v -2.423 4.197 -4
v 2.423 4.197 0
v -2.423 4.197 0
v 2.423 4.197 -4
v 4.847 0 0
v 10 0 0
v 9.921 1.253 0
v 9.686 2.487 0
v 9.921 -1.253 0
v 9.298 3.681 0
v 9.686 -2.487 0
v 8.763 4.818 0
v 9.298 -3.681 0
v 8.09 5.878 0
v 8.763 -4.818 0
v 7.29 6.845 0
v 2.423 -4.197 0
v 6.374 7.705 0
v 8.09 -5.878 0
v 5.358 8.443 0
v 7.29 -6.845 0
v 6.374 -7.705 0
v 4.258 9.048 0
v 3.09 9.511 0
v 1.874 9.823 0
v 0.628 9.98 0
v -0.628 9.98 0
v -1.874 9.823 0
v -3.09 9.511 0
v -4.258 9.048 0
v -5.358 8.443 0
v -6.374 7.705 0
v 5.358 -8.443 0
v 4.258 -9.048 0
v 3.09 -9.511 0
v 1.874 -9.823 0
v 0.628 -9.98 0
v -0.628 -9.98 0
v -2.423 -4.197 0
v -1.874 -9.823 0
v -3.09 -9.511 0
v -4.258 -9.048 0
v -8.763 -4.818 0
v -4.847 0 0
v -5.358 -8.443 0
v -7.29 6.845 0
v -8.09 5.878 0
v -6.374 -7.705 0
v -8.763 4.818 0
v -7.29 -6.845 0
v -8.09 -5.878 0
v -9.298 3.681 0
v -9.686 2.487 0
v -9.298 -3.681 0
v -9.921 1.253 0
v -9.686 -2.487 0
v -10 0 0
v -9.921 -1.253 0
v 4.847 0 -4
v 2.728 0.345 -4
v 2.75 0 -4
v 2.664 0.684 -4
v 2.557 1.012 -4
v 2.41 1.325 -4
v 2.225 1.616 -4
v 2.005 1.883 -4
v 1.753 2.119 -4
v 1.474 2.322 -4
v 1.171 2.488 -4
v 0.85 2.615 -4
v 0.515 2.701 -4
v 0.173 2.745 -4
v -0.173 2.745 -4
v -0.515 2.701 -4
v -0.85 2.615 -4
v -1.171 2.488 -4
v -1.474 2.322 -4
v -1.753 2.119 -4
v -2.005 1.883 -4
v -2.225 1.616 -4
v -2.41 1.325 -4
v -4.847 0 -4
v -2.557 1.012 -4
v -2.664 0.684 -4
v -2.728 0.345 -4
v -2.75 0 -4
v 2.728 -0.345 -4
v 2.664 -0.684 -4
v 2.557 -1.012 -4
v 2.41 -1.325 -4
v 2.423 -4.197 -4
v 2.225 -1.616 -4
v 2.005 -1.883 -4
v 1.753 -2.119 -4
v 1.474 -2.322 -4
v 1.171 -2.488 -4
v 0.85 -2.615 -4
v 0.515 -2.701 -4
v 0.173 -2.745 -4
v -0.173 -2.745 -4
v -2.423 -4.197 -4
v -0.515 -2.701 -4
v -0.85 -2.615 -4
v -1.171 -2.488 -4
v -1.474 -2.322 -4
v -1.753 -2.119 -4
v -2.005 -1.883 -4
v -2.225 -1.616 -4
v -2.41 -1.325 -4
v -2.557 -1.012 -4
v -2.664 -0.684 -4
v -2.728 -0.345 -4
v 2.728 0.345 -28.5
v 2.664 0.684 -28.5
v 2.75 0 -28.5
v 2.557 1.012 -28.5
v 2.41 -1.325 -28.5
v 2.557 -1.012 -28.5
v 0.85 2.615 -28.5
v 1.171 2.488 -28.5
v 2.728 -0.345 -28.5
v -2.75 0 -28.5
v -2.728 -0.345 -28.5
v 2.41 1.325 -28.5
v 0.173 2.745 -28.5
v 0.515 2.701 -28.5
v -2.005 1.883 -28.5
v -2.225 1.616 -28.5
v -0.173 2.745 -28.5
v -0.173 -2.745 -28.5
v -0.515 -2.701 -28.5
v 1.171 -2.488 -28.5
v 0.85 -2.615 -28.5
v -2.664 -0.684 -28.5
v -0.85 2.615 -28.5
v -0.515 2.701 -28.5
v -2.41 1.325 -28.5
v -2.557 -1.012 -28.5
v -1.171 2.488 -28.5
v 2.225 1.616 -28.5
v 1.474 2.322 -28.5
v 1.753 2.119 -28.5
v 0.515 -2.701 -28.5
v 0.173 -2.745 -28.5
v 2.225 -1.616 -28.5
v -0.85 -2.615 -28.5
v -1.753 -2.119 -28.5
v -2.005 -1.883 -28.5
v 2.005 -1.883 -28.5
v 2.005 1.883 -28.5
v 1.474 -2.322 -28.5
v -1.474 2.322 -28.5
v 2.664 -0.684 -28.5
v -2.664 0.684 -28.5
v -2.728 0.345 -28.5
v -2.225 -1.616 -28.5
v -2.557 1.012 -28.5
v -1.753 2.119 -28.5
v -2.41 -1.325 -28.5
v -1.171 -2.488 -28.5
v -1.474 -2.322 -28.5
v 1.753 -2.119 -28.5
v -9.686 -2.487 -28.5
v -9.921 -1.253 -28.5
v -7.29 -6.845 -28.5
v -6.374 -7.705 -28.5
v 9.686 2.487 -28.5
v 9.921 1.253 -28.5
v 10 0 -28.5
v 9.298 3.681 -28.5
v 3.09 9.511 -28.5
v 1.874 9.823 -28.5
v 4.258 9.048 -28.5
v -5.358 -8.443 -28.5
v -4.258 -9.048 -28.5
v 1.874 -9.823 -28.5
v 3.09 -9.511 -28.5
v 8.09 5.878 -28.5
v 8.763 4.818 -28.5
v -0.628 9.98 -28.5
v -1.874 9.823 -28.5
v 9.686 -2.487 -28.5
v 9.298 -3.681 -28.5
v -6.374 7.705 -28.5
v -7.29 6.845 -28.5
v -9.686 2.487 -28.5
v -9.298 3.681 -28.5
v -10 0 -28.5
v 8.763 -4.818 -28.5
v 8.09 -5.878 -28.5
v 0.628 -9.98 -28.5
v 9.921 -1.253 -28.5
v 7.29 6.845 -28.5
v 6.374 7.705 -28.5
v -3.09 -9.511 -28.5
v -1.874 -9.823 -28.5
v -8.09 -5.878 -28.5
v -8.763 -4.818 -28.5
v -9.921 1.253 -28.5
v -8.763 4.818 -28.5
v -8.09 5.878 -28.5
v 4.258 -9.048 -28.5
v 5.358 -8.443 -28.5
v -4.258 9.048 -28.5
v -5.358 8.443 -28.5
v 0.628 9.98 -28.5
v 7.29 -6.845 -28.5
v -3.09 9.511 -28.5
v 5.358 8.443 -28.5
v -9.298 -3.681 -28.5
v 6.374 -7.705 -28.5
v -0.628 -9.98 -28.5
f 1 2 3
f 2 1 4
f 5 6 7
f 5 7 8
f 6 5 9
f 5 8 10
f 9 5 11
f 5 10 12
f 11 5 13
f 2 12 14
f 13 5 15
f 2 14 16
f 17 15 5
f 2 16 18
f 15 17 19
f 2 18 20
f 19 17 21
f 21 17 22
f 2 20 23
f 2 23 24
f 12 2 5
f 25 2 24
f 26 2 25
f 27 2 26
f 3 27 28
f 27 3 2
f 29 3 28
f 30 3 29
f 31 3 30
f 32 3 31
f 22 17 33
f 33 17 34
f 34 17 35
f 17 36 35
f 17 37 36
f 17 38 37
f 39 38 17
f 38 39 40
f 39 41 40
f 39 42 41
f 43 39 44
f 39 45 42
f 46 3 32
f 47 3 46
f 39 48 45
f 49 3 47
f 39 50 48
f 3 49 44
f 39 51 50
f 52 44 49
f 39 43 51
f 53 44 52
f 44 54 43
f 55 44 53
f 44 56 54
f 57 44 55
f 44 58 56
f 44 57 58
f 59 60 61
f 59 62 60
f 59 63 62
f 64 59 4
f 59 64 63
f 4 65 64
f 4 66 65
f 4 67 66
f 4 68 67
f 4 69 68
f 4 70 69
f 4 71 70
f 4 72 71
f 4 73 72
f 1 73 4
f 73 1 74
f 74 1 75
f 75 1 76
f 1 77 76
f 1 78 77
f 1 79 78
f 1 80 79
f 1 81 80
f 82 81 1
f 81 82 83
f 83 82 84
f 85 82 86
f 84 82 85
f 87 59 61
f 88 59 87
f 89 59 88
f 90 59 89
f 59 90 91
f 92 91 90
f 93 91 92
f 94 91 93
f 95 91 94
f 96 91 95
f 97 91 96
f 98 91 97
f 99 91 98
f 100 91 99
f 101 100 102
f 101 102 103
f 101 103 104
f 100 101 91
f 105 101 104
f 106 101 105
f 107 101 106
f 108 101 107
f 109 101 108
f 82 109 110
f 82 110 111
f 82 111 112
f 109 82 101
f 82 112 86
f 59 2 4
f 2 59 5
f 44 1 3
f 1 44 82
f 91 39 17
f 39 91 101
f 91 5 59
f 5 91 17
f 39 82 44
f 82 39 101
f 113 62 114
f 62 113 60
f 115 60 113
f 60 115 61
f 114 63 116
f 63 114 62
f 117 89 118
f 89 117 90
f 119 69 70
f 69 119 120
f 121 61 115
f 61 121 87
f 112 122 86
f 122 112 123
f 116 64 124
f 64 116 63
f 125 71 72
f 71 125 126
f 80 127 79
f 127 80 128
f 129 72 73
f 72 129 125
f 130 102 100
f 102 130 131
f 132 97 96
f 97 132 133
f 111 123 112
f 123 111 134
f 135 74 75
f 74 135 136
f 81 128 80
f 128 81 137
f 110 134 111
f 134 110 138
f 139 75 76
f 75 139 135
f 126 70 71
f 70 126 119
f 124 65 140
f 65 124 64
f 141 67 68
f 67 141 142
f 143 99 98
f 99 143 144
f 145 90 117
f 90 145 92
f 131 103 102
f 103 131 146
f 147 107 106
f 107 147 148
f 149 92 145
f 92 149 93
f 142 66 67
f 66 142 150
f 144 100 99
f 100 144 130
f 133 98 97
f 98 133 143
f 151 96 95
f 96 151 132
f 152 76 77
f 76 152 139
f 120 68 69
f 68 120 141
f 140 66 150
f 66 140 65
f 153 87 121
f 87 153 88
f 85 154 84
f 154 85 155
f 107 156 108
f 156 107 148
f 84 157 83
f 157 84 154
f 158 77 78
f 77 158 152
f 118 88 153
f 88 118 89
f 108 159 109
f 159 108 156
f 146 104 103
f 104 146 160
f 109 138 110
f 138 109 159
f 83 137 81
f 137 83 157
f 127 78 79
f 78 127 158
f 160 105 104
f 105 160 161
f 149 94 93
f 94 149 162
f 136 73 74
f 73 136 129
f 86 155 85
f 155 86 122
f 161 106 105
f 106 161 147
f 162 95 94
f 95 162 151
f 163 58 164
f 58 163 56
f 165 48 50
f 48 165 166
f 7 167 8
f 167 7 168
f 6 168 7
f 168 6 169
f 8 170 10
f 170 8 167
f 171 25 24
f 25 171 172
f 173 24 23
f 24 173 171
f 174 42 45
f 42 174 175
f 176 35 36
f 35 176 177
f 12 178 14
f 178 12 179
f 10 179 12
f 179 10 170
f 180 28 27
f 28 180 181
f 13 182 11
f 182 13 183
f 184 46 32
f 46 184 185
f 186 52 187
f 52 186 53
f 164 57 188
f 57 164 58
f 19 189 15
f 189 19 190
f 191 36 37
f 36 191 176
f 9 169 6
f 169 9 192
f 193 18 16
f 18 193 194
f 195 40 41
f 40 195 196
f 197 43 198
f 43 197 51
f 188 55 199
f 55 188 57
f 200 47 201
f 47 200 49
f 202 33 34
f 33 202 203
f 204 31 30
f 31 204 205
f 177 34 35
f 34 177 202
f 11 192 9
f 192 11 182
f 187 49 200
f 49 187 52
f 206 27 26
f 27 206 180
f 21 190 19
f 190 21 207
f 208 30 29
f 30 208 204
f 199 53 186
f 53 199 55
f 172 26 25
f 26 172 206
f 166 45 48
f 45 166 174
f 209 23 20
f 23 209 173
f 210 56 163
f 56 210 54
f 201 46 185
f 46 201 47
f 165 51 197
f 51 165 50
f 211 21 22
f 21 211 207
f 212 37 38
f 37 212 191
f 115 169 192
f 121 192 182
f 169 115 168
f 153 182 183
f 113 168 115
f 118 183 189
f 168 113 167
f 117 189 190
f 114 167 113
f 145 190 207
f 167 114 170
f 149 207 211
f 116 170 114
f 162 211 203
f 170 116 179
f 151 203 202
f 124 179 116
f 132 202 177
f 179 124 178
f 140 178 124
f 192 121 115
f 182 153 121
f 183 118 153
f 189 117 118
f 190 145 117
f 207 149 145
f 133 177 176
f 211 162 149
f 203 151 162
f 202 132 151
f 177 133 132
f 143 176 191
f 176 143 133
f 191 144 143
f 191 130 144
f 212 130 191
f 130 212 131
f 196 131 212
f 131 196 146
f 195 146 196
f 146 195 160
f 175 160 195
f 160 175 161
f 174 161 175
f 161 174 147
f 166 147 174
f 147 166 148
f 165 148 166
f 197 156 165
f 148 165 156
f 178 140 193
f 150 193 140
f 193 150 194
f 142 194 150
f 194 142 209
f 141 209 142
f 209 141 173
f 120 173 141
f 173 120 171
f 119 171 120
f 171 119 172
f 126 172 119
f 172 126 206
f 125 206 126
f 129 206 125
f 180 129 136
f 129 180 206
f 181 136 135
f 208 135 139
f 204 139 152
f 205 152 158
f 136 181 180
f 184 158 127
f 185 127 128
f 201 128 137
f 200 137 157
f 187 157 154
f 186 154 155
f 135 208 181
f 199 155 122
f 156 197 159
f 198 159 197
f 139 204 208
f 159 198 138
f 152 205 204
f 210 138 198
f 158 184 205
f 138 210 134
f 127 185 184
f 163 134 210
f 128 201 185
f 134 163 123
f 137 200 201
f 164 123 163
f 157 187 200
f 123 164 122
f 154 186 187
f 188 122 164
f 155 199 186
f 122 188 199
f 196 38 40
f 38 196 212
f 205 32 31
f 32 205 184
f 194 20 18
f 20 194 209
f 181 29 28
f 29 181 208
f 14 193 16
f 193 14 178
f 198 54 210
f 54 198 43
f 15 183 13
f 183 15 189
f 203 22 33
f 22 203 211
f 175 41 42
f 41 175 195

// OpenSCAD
$fn = 50;


difference() {
	union() {
		translate(v = [0, 0, -28.5000000000]) {
			cylinder(h = 28.5000000000, r = 10.0000000000);
		}
	}
	union() {
		translate(v = [0, 0, 0]) {
			rotate(a = [0, 0, 0]) {
				difference() {
					union() {
						translate(v = [0, 0, -4]) {
							linear_extrude(height = 4) {
								polygon(points = [[4.8468000000, 0.0000000000], [2.4234000000, 4.1974519271], [-2.4234000000, 4.1974519271], [-4.8468000000, 0.0000000000], [-2.4234000000, -4.1974519271], [2.4234000000, -4.1974519271]]);
							}
						}
					}
					union();
				}
			}
		}
		#translate(v = [0, 0, -100.0000000000]) {
			cylinder(h = 200, r = 2.7500000000);
		}
	}
}
